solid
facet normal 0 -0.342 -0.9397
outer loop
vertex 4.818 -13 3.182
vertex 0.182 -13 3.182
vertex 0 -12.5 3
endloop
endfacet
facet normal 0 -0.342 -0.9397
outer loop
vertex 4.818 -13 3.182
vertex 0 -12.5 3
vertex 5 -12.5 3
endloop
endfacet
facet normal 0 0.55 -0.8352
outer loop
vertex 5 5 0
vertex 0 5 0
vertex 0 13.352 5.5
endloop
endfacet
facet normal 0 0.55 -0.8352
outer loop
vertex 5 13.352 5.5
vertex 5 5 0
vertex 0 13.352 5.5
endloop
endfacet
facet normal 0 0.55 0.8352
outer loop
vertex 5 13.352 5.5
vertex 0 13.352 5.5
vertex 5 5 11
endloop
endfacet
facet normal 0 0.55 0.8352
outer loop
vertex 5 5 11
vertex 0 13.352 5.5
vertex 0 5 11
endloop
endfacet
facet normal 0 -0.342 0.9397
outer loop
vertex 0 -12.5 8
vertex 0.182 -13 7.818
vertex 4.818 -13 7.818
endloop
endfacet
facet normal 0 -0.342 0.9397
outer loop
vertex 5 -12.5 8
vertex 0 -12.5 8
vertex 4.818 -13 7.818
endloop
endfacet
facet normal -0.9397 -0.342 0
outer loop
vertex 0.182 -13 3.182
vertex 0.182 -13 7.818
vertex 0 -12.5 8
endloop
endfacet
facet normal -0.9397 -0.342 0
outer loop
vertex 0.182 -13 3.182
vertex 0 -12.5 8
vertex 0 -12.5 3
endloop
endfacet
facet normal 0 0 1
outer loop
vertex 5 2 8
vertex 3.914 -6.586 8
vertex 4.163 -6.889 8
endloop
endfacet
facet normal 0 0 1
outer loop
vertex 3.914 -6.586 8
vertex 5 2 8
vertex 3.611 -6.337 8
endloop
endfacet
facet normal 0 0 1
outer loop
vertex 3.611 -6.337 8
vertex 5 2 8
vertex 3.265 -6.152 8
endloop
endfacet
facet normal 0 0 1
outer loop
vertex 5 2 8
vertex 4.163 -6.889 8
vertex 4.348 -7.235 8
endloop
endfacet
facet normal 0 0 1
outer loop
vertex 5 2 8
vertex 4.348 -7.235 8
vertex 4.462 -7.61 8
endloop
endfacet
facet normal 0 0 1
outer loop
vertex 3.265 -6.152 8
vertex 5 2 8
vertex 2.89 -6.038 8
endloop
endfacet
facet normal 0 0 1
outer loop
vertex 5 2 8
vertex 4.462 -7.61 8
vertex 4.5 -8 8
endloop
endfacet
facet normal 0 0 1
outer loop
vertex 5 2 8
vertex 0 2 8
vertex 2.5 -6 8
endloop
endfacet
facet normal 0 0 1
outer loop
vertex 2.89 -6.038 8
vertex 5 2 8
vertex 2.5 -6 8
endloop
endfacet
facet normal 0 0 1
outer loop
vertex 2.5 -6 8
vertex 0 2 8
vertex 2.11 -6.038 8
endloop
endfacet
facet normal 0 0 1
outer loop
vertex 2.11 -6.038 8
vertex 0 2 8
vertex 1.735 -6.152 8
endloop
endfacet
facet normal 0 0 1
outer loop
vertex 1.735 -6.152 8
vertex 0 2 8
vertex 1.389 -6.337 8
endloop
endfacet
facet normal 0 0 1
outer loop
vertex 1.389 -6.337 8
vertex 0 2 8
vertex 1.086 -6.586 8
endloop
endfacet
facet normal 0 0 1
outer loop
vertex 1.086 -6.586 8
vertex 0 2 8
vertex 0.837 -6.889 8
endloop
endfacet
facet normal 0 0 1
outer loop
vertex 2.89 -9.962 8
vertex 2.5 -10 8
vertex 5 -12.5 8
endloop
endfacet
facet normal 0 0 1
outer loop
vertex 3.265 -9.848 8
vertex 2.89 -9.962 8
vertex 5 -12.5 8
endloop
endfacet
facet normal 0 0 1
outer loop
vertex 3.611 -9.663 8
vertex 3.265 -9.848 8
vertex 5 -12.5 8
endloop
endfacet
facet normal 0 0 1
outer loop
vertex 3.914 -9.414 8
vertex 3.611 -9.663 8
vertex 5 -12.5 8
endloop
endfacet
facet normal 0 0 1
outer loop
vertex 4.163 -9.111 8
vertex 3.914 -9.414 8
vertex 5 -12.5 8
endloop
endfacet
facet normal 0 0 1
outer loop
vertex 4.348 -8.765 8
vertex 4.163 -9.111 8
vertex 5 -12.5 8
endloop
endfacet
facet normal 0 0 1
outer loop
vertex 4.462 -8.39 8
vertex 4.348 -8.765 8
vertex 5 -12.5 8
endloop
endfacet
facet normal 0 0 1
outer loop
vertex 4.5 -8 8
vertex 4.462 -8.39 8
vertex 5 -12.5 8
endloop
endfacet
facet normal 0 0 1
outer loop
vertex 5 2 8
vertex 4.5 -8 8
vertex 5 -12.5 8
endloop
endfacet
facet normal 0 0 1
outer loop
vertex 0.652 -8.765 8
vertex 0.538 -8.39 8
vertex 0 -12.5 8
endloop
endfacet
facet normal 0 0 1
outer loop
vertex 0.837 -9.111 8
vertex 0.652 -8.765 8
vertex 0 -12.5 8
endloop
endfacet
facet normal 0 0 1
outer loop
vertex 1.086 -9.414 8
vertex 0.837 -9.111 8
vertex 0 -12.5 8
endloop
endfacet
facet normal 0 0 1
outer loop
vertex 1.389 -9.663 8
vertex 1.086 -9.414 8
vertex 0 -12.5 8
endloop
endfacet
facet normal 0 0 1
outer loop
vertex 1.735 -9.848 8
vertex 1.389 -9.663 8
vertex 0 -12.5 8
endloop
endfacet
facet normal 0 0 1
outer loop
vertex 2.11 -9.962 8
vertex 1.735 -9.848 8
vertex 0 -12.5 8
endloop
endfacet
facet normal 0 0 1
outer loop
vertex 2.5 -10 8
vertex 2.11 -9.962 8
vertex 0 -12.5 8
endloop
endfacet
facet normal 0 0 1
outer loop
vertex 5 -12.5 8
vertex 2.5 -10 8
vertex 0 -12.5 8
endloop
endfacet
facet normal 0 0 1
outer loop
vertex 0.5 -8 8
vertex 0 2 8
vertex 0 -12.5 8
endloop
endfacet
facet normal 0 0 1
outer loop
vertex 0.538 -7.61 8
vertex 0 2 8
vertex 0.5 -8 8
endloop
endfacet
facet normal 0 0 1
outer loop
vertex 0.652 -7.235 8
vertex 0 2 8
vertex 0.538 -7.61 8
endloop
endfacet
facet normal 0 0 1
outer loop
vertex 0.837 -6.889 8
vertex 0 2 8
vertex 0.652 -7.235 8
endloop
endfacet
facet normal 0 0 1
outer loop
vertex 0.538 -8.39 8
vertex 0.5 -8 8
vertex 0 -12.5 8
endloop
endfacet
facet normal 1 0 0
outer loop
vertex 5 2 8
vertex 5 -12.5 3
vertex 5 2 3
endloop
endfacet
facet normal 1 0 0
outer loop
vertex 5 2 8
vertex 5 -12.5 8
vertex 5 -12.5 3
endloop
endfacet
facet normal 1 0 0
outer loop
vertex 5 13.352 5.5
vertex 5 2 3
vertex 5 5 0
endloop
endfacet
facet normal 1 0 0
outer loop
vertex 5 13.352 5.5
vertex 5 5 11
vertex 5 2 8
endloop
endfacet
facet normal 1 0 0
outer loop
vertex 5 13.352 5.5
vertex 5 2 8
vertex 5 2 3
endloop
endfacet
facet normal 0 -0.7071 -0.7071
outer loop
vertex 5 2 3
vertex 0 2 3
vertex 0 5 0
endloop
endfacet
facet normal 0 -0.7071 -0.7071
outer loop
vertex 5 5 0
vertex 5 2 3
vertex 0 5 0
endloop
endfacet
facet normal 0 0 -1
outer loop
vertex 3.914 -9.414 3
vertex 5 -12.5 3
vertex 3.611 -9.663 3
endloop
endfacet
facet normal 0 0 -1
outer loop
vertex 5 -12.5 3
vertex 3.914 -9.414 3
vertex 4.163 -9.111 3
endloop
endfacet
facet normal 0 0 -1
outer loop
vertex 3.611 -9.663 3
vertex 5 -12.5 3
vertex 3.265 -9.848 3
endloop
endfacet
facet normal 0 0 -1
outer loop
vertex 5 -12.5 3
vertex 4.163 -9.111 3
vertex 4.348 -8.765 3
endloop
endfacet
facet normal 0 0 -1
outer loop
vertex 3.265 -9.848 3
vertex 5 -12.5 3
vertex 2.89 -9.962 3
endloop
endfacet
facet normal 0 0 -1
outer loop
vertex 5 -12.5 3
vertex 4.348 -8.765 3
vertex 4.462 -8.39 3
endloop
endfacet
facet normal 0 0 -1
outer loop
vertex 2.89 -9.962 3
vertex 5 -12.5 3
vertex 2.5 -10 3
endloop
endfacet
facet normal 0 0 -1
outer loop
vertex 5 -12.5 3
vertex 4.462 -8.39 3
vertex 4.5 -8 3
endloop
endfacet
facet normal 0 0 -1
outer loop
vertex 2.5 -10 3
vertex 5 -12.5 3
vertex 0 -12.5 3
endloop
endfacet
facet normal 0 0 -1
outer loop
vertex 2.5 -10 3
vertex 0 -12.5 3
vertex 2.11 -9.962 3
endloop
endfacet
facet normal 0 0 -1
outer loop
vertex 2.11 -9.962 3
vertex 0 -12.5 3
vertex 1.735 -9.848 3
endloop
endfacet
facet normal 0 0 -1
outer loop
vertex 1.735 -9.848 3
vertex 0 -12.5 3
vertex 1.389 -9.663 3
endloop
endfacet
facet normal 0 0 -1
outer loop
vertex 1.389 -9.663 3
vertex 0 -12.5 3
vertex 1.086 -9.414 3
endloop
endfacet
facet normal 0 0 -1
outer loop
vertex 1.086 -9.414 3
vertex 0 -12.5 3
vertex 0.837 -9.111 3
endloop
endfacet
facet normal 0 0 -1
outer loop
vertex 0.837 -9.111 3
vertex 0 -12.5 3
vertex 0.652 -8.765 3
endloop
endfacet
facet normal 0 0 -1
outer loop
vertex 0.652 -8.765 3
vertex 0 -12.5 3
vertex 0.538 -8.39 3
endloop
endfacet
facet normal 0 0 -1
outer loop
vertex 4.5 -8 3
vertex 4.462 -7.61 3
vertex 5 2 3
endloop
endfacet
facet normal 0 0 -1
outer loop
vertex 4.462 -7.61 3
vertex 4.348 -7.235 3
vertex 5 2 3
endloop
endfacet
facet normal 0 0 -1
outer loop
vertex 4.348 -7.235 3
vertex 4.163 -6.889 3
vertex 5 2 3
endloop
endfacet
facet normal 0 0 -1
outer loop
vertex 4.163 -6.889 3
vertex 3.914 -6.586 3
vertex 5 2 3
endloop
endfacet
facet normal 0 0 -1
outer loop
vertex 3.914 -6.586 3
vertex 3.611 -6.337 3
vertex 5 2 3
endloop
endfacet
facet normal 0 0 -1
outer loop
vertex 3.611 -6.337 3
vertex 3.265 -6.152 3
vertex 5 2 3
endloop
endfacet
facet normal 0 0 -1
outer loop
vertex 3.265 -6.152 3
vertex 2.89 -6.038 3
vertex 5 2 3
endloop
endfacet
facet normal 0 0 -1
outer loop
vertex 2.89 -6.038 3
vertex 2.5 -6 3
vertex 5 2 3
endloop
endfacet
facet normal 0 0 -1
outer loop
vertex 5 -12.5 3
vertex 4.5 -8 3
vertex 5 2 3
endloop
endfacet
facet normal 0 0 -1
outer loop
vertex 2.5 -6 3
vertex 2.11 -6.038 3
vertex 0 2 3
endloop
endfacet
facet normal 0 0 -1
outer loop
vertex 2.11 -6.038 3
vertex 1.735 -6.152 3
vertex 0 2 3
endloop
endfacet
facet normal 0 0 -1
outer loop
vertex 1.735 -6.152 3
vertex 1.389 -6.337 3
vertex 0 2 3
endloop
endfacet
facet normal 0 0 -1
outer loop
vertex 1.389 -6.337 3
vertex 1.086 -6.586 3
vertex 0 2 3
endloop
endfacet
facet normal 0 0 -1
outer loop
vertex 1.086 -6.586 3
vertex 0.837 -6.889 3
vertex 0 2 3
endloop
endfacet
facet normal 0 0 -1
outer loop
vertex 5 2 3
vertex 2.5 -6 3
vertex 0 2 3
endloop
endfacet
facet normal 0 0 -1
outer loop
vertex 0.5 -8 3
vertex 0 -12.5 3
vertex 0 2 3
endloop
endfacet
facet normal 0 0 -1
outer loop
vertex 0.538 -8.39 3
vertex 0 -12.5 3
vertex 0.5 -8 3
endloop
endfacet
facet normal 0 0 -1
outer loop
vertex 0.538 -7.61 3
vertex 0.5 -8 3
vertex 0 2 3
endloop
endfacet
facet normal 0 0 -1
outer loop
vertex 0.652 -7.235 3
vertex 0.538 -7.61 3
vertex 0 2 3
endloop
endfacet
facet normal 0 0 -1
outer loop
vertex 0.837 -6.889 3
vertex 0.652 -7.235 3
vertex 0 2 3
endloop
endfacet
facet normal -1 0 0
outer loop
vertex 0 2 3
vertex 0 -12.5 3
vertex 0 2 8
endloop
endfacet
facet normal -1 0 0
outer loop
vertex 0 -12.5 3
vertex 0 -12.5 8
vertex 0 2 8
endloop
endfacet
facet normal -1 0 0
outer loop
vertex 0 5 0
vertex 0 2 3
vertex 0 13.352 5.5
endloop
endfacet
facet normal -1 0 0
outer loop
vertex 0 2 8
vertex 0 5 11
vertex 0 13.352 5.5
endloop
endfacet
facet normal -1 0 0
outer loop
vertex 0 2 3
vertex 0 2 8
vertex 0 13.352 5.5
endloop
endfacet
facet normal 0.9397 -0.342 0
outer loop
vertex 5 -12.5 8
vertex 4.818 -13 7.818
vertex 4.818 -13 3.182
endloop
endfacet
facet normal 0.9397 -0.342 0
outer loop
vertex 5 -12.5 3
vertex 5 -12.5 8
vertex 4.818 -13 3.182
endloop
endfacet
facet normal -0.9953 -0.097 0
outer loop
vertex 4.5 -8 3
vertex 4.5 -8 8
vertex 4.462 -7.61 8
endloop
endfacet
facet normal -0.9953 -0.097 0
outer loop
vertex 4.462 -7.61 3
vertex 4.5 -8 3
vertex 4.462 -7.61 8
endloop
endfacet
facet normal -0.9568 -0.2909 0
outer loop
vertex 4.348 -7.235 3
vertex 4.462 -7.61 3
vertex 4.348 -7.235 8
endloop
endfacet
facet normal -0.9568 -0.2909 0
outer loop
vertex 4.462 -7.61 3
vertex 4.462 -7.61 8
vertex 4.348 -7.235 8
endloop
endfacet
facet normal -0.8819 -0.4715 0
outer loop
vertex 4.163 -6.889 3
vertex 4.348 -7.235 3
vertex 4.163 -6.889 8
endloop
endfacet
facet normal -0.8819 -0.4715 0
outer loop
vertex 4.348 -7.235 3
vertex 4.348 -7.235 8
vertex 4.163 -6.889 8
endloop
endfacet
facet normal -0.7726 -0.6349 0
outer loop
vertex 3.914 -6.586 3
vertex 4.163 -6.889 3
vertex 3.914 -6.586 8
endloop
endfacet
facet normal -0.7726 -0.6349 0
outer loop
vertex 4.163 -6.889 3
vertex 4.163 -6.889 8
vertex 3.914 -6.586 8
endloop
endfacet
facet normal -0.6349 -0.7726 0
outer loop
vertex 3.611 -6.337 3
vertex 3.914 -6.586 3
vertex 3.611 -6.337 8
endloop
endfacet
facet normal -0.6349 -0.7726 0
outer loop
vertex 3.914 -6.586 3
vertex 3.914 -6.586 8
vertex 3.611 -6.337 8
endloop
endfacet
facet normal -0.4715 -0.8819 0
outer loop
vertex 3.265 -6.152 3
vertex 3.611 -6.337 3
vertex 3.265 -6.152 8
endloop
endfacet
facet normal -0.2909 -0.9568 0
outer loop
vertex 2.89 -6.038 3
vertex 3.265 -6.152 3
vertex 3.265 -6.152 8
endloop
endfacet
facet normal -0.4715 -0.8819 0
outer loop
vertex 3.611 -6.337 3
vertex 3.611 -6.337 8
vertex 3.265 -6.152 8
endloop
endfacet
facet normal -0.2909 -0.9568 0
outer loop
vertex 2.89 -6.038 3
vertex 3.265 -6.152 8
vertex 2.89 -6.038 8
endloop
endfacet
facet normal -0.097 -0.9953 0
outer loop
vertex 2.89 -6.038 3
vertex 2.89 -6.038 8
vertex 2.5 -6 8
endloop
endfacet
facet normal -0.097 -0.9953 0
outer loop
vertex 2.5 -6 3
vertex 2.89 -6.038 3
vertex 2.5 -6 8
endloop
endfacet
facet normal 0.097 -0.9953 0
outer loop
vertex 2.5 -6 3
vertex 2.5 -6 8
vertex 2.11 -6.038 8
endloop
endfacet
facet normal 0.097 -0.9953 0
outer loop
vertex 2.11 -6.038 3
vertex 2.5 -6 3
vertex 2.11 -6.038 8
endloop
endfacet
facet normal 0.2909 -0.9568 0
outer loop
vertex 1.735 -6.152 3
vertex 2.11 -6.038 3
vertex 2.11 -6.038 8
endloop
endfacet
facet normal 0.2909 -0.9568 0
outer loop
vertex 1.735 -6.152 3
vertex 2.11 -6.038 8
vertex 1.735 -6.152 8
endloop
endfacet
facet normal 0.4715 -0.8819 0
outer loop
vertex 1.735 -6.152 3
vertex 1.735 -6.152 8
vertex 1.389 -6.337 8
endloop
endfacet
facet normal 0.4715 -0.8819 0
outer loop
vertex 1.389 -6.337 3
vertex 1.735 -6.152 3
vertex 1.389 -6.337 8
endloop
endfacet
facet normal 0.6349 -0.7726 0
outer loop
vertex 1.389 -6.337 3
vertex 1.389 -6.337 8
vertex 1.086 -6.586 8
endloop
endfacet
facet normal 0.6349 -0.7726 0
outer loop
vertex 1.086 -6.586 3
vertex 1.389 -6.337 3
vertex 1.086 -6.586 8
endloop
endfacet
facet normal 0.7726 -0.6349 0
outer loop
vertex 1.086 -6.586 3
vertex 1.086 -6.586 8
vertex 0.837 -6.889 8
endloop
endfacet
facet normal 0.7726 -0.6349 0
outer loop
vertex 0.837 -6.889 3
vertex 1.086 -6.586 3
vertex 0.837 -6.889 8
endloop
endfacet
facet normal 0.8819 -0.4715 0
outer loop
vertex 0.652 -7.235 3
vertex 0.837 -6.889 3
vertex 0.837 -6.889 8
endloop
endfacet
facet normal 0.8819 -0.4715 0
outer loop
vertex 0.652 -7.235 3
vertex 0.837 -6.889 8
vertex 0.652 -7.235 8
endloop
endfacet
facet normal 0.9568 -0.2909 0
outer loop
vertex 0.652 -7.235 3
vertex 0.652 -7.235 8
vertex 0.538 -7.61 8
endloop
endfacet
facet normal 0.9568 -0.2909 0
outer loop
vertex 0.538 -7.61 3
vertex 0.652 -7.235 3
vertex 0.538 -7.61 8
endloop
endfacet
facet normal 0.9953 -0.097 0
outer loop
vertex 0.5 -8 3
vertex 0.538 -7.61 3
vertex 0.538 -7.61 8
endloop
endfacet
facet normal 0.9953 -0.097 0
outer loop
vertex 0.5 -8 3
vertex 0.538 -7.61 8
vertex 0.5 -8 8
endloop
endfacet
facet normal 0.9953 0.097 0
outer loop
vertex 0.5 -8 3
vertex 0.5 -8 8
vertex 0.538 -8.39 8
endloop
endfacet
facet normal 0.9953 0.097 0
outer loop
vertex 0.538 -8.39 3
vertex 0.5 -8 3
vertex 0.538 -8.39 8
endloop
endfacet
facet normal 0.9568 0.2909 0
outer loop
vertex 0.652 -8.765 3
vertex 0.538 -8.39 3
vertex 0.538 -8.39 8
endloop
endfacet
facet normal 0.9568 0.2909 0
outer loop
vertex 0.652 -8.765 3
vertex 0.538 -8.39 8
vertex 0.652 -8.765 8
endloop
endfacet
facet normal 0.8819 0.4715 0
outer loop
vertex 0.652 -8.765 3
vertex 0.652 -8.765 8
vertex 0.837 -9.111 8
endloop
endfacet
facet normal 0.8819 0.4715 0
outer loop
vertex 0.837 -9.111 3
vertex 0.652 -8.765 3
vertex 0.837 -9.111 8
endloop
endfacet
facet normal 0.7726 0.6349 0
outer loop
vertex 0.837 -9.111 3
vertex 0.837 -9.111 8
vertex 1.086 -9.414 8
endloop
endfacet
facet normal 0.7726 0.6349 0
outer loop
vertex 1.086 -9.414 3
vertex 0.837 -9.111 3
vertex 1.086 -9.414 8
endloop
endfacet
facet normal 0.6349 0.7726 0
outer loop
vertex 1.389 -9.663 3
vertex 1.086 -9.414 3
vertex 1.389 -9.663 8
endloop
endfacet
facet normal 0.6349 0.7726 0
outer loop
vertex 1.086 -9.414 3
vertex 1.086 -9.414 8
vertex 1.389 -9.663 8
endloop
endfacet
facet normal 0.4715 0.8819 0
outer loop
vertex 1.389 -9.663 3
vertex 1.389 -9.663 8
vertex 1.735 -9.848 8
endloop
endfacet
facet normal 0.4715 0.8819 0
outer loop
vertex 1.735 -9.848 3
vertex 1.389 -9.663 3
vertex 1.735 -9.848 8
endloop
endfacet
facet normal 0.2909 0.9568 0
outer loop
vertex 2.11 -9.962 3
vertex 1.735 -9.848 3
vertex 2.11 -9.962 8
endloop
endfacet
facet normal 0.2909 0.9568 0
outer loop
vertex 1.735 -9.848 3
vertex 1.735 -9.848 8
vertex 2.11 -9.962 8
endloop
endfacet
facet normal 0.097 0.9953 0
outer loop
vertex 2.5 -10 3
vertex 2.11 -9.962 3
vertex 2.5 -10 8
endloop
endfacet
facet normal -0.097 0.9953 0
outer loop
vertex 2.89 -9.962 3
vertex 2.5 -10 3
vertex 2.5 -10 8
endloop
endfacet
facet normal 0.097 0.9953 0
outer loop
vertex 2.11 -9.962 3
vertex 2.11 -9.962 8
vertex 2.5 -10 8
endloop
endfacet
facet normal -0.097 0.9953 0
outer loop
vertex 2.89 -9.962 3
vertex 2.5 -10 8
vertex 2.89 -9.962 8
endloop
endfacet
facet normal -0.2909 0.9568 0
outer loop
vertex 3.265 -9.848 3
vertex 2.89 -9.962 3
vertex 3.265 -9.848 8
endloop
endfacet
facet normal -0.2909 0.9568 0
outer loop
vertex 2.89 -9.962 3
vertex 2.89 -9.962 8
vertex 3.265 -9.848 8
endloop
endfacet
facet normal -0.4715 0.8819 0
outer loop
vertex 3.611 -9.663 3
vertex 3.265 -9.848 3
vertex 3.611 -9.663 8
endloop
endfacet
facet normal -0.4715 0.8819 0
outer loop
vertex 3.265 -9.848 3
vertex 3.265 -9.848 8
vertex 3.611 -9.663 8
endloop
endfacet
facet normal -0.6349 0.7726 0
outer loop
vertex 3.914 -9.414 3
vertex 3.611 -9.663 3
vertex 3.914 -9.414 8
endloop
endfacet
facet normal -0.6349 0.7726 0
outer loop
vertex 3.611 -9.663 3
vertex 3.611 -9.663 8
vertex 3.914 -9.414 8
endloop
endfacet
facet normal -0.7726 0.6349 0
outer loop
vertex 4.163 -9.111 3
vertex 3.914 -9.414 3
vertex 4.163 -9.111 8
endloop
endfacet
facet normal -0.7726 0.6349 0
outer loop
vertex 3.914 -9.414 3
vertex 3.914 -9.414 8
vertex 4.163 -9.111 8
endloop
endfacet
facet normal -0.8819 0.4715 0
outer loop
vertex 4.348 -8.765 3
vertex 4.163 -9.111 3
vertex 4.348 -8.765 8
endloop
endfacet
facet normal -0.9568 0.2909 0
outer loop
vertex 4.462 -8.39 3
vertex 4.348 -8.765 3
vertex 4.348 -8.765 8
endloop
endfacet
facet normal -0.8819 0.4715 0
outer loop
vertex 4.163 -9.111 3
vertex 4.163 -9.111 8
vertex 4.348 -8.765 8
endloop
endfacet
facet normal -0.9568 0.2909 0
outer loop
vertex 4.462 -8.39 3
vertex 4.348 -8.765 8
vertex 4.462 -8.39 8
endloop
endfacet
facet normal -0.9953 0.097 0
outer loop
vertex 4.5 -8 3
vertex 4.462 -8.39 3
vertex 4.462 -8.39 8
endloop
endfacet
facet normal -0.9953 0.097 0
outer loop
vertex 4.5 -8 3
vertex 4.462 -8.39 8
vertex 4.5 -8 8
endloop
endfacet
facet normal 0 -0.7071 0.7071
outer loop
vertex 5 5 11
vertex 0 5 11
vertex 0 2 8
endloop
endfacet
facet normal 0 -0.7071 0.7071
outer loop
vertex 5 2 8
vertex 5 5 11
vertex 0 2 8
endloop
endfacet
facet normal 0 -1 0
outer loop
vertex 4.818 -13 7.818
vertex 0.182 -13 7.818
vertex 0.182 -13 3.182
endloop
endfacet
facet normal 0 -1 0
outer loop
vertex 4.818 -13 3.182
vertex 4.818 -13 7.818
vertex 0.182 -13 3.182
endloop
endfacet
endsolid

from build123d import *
from OCP.BRepFilletAPI import BRepFilletAPI_MakeChamfer

# Parameters (mm, degrees)
BOSS_EXTRUDE1_DEPTH = 5
SKETCH4_R           = 2
CUT_EXTRUDE2_DEPTH  = 10
CHAMFER1_SIZE       = 0.5
CHAMFER1_SIZE2      = 0.181985117


with BuildPart() as part:
    # Sketch2 → Boss-Extrude1 (new body)
    with BuildSketch(Plane.YZ):
        Polygon((-3, 8), (-13, 8), (-13, 3), (-3, 3), (2, 3), (5, 0), (13.351646544, 5.5), (5, 11), (2, 8), align=None)
    extrude(amount=BOSS_EXTRUDE1_DEPTH)

    # Sketch4 → Cut-Extrude2 (cut)
    with BuildSketch(Plane.XY.offset(8)):
        with Locations((2.5, -8)):
            Circle(SKETCH4_R)
    extrude(amount=-CUT_EXTRUDE2_DEPTH, mode=Mode.SUBTRACT)

    # Chamfer1: one chamfer whose edges measure the first distance from different faces: ONE call of the kernel's chamfer builder (chamfer() names one face for all edges)
    chamfer1_edges_1 = [part.edges().sort_by_distance(p)[0] for p in [
        (0, -13, 5.5),
    ]]
    chamfer1_side_1 = [part.faces().sort_by_distance(p)[0] for p in [
        (0, 0.23145202, 5.5),
    ]]
    chamfer1_edges_2 = [part.edges().sort_by_distance(p)[0] for p in [
        (2.5, -13, 3),
    ]]
    chamfer1_side_2 = [part.faces().sort_by_distance(p)[0] for p in [
        (2.5, -4.996810824, 3),
    ]]
    chamfer1_edges_3 = [part.edges().sort_by_distance(p)[0] for p in [
        (2.5, -13, 8),
    ]]
    chamfer1_side_3 = [part.faces().sort_by_distance(p)[0] for p in [
        (2.5, -4.996810824, 8),
    ]]
    chamfer1_edges_4 = [part.edges().sort_by_distance(p)[0] for p in [
        (5, -13, 5.5),
    ]]
    chamfer1_side_4 = [part.faces().sort_by_distance(p)[0] for p in [
        (5, 0.23145202, 5.5),
    ]]
    chamfer1 = BRepFilletAPI_MakeChamfer(part.part.solid().wrapped)
    for e in chamfer1_edges_1:
        chamfer1.Add(CHAMFER1_SIZE, CHAMFER1_SIZE2, e.wrapped, chamfer1_side_1[0].wrapped)  # the first distance lies on this face
    for e in chamfer1_edges_2:
        chamfer1.Add(CHAMFER1_SIZE, CHAMFER1_SIZE2, e.wrapped, chamfer1_side_2[0].wrapped)  # the first distance lies on this face
    for e in chamfer1_edges_3:
        chamfer1.Add(CHAMFER1_SIZE, CHAMFER1_SIZE2, e.wrapped, chamfer1_side_3[0].wrapped)  # the first distance lies on this face
    for e in chamfer1_edges_4:
        chamfer1.Add(CHAMFER1_SIZE, CHAMFER1_SIZE2, e.wrapped, chamfer1_side_4[0].wrapped)  # the first distance lies on this face
    add(Compound.cast(chamfer1.Shape()), mode=Mode.REPLACE)


solid = part.part
